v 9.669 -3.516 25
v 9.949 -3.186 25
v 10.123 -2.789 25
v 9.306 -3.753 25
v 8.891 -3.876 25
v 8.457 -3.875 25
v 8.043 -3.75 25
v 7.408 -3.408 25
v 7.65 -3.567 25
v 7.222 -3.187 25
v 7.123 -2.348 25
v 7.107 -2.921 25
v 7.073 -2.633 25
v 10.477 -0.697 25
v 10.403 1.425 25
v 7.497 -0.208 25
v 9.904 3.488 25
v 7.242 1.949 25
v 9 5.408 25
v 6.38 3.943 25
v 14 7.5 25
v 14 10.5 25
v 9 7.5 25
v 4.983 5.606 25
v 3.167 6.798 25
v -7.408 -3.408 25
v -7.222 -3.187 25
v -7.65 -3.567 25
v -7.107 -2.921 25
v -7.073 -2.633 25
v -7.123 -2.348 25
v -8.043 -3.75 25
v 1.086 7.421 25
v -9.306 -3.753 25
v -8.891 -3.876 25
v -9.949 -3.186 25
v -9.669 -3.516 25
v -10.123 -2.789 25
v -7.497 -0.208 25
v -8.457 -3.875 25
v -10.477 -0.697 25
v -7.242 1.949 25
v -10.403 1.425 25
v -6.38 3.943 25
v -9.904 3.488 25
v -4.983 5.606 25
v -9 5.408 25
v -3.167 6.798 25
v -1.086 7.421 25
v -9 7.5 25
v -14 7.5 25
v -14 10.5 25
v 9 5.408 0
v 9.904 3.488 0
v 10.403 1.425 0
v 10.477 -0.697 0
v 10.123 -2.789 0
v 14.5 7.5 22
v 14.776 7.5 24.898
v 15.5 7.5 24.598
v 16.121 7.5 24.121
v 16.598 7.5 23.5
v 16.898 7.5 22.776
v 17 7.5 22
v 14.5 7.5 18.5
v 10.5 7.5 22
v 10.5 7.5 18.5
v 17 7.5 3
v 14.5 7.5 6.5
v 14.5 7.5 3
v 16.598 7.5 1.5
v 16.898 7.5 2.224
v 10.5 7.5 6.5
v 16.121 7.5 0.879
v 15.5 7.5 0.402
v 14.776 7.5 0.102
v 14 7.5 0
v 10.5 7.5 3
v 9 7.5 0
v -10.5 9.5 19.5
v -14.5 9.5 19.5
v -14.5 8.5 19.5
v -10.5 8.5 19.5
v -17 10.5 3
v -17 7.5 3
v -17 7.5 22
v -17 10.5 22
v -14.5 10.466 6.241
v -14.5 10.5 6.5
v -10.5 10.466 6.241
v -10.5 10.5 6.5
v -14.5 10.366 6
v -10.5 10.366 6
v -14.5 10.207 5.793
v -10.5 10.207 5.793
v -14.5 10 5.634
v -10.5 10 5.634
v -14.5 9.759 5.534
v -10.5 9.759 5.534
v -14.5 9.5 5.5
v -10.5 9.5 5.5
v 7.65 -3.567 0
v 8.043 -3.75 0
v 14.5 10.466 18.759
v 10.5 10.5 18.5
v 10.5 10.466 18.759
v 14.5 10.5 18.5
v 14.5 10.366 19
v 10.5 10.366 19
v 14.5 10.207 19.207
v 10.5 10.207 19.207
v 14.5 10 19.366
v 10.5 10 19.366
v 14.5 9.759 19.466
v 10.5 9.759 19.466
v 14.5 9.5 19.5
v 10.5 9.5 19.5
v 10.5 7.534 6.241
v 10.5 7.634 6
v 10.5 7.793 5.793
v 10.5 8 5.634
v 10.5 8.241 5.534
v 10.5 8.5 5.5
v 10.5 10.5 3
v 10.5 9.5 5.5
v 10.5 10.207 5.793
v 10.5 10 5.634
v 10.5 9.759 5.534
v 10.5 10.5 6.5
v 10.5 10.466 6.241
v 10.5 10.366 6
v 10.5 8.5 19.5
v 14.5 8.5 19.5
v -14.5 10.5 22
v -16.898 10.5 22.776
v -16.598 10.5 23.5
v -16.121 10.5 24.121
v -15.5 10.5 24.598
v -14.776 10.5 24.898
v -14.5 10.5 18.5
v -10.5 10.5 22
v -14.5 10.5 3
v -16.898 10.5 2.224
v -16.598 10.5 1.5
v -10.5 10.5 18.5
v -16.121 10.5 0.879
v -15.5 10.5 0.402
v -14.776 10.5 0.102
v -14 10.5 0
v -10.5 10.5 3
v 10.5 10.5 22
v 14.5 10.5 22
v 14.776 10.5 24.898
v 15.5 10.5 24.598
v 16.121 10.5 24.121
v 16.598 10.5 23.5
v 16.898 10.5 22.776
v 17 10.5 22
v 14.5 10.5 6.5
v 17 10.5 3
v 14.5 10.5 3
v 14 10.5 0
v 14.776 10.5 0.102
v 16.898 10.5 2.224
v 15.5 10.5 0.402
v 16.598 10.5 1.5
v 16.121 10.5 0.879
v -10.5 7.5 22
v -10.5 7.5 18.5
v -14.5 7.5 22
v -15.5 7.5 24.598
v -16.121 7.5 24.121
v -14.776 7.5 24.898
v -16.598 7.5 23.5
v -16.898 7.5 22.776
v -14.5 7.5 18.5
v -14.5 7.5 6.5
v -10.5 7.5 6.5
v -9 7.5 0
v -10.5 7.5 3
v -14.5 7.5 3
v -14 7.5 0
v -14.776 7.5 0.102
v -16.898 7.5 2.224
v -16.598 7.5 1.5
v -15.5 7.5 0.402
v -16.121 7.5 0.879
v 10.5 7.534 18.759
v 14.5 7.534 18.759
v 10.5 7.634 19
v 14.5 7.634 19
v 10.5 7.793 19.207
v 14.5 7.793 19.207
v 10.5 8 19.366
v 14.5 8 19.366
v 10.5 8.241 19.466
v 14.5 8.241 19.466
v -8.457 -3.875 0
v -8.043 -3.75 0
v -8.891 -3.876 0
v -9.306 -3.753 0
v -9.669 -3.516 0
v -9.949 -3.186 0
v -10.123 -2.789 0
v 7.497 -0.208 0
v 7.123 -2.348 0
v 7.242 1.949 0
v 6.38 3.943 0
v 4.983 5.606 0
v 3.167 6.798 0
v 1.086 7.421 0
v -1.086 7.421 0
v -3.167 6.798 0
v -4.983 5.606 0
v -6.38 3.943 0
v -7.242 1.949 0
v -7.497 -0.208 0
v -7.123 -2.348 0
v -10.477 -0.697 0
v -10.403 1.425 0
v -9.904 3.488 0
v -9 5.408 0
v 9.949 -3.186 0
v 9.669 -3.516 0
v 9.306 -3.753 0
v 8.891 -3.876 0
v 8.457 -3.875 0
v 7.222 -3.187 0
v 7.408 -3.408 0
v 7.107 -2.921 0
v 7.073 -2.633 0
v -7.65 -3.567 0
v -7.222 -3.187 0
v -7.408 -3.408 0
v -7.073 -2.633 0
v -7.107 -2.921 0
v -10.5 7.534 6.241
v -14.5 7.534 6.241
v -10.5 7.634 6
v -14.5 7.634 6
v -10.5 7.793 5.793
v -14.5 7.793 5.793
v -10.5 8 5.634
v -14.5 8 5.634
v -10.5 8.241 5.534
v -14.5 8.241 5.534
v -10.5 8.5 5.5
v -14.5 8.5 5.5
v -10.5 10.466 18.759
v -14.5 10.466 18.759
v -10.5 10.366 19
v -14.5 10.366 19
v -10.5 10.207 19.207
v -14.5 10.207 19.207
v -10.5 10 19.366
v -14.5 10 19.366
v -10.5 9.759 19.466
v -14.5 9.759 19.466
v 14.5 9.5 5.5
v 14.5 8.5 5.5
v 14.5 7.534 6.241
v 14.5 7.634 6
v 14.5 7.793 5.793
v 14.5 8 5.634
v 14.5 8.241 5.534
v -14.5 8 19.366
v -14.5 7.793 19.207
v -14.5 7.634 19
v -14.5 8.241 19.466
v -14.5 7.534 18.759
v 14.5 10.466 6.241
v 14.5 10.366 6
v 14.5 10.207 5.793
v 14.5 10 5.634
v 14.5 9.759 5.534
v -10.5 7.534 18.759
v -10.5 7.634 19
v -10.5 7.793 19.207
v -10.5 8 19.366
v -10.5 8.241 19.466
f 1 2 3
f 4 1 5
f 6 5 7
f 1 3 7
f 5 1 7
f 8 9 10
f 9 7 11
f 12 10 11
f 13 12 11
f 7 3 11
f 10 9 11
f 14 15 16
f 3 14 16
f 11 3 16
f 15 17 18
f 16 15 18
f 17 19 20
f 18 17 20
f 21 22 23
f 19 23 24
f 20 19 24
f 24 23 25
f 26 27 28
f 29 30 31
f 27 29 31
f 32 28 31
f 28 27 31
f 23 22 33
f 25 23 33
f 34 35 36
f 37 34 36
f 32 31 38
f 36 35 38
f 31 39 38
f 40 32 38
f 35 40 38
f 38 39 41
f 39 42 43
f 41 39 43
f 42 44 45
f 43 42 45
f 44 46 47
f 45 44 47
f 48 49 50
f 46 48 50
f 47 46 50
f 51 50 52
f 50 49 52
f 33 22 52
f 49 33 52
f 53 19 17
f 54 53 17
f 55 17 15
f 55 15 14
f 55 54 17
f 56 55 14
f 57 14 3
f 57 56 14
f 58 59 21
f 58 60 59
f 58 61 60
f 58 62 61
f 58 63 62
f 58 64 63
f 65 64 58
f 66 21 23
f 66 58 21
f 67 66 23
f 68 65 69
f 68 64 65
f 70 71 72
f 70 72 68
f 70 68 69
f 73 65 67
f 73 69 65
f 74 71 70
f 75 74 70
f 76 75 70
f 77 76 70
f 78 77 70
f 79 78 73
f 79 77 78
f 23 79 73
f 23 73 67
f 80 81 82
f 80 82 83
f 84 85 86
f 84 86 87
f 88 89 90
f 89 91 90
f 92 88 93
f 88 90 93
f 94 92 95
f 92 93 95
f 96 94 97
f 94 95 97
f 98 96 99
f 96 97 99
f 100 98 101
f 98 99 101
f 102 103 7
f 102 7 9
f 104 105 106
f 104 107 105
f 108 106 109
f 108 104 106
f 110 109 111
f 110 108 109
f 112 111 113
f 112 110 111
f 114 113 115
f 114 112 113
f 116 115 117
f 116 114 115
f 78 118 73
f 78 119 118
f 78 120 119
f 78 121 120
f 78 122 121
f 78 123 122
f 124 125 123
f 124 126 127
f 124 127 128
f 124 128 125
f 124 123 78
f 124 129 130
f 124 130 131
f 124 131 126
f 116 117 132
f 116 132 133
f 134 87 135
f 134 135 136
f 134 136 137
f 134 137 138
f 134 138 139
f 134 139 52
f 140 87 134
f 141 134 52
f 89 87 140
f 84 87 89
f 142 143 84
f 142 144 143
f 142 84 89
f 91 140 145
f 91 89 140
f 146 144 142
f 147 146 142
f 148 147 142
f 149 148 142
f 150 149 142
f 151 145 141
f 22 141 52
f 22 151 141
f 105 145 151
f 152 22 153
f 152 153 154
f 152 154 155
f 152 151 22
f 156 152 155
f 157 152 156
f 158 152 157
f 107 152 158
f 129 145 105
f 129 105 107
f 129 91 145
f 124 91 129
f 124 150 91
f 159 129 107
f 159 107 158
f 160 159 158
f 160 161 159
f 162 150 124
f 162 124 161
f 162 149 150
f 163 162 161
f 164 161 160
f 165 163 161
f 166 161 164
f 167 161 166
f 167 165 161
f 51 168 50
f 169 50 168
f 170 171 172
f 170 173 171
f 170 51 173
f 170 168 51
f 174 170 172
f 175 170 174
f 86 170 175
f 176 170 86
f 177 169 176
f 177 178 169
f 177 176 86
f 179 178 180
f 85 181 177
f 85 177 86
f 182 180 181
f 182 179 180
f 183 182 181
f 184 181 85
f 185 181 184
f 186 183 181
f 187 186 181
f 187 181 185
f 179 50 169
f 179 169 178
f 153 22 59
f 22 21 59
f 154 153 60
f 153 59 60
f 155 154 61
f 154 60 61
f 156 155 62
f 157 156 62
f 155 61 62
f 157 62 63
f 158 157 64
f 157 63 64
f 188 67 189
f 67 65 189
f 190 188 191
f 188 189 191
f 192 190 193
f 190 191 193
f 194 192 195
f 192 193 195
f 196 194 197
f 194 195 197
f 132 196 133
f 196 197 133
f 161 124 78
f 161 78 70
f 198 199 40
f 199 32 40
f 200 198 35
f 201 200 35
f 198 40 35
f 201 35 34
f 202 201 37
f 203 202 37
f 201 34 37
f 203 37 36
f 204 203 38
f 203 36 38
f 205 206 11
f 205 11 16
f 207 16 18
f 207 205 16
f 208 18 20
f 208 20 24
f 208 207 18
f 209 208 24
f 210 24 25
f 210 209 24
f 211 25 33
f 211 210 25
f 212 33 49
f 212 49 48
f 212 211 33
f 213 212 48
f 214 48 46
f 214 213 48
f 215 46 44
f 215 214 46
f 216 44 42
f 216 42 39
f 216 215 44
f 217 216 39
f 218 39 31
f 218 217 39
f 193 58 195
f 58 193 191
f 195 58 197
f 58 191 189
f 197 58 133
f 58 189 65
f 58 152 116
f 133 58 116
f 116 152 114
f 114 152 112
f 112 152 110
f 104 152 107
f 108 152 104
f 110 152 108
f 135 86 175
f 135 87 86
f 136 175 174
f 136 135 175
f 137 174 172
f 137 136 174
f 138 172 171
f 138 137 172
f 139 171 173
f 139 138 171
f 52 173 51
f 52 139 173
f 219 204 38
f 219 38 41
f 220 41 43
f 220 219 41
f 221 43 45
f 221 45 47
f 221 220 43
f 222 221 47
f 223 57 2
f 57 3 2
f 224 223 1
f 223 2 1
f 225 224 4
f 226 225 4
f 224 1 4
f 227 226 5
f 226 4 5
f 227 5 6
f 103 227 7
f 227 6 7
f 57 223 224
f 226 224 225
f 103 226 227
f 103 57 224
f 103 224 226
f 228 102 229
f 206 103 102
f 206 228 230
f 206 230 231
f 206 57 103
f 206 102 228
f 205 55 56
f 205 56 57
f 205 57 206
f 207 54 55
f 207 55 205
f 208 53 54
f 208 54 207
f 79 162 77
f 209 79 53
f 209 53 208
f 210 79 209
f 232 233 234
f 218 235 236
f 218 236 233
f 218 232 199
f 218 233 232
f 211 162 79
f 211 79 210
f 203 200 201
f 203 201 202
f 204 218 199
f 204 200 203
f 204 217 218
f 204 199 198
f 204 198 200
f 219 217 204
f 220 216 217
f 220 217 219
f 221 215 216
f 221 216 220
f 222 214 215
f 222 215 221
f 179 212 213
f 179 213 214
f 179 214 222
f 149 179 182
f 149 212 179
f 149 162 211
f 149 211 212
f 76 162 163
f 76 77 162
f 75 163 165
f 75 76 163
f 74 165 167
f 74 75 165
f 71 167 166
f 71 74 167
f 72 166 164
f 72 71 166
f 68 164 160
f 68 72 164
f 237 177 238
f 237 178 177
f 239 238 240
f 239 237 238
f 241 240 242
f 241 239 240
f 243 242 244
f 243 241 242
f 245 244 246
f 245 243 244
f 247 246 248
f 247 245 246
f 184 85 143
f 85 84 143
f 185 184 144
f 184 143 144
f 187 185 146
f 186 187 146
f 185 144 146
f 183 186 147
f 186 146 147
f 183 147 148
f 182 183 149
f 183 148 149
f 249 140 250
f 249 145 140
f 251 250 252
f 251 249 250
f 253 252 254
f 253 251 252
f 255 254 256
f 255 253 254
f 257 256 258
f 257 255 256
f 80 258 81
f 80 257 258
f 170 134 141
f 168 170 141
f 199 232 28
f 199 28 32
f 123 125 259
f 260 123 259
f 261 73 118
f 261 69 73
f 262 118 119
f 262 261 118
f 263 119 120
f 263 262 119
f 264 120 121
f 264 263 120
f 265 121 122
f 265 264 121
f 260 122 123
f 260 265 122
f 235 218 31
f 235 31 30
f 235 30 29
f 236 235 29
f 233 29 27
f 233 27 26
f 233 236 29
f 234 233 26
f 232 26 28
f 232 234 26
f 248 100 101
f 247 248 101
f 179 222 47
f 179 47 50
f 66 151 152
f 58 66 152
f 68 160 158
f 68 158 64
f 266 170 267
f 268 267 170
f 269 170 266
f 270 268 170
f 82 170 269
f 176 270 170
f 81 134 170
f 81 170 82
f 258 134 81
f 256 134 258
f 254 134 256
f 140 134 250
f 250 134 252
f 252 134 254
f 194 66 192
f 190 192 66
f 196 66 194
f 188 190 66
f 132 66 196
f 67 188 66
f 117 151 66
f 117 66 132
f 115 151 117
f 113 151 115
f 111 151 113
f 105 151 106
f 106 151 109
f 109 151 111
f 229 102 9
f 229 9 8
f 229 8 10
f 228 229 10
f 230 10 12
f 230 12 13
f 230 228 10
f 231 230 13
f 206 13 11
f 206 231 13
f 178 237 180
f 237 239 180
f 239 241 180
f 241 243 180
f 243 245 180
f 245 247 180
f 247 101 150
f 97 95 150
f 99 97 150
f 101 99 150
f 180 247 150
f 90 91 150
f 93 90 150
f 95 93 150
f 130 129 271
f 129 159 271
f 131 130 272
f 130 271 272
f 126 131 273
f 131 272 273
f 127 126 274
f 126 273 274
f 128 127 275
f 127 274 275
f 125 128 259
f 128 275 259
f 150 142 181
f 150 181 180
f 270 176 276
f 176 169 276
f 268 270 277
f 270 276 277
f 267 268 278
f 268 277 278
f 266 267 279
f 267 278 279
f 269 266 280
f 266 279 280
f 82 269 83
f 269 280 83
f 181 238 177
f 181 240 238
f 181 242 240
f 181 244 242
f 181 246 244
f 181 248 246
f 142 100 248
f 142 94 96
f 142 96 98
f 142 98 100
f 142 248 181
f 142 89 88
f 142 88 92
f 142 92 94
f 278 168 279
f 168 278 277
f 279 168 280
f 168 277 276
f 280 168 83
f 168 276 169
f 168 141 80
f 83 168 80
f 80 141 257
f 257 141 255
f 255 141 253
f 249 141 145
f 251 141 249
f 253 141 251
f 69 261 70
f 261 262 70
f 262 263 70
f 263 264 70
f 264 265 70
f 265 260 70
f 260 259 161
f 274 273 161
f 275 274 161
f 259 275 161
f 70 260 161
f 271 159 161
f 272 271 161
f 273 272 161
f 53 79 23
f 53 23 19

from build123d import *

# Parameters (mm, degrees)
RESSALTO_EXTRUS_O1_DEPTH = 25
FILETE1_R                = 1.5
CORTE_EXTRUS_O1_REACH    = 35.483
ESBO_O3_W                = 4
ESBO_O3_H                = 2.5
FILETE2_R                = 1
FILETE3_R                = 3


with BuildPart() as part:
    # Esboço1 → Ressalto-extrusão1 (new body)
    with BuildSketch(Plane.XY):
        with BuildLine():
            Line((-17, 10.5), (17, 10.5))
            Line((17, 10.5), (17, 7.5))
            Line((17, 7.5), (9, 7.5))
            Line((9, 7.5), (9, 5.408326913))
            ThreePointArc((9, 5.408326913), (10.485597072, 0.549776353), (9.516231764, -4.437491748))
            Line((9.516231764, -4.437491748), (7.650118208, -3.567308706))
            ThreePointArc((7.650118208, -3.567308706), (7.15483055, -3.057799008), (7.123002767, -2.347941987))
            ThreePointArc((7.123002767, -2.347941987), (0, 7.5), (-7.123002767, -2.347941987))
            ThreePointArc((-7.123002767, -2.347941987), (-7.15483055, -3.057799008), (-7.650118208, -3.567308706))
            Line((-7.650118208, -3.567308706), (-9.516231764, -4.437491748))
            ThreePointArc((-9.516231764, -4.437491748), (-10.485597072, 0.549776353), (-9, 5.408326913))
            Line((-9, 5.408326913), (-9, 7.5))
            Line((-9, 7.5), (-17, 7.5))
            Line((-17, 7.5), (-17, 10.5))
        make_face()
    extrude(amount=RESSALTO_EXTRUS_O1_DEPTH)

    # Filete1
    filete1_edges = [part.edges().sort_by_distance(p)[0] for p in [
        (-9.516231764, -4.437491748, 12.5),
        (9.516231764, -4.437491748, 12.5),
    ]]
    fillet(filete1_edges, radius=FILETE1_R)

    # Esboço3 → Corte-extrusão1 (cut, up to next)
    with BuildSketch(Plane(origin=(0, 10.5, 0), x_dir=(1, 0, 0), z_dir=(0, 1, 0)), mode=Mode.PRIVATE) as corte_extrus_o1_sk1:
        with Locations((-12.5, -4.25)):
            Rectangle(ESBO_O3_W, ESBO_O3_H)
    corte_extrus_o1_tool1 = extrude(corte_extrus_o1_sk1.sketch, amount=-CORTE_EXTRUS_O1_REACH, mode=Mode.PRIVATE) & part.part
    # Esboço3 → Corte-extrusão1 (cut, up to next)
    with BuildSketch(Plane(origin=(0, 10.5, 0), x_dir=(1, 0, 0), z_dir=(0, 1, 0)), mode=Mode.PRIVATE) as corte_extrus_o1_sk2:
        with Locations((-12.5, -20.75)):
            Rectangle(ESBO_O3_W, ESBO_O3_H)
    corte_extrus_o1_tool2 = extrude(corte_extrus_o1_sk2.sketch, amount=-CORTE_EXTRUS_O1_REACH, mode=Mode.PRIVATE) & part.part
    # Esboço3 → Corte-extrusão1 (cut, up to next)
    with BuildSketch(Plane(origin=(0, 10.5, 0), x_dir=(1, 0, 0), z_dir=(0, 1, 0)), mode=Mode.PRIVATE) as corte_extrus_o1_sk3:
        with Locations((12.5, -20.75)):
            Rectangle(ESBO_O3_W, ESBO_O3_H)
    corte_extrus_o1_tool3 = extrude(corte_extrus_o1_sk3.sketch, amount=-CORTE_EXTRUS_O1_REACH, mode=Mode.PRIVATE) & part.part
    # Esboço3 → Corte-extrusão1 (cut, up to next)
    with BuildSketch(Plane(origin=(0, 10.5, 0), x_dir=(1, 0, 0), z_dir=(0, 1, 0)), mode=Mode.PRIVATE) as corte_extrus_o1_sk4:
        with Locations((12.5, -4.25)):
            Rectangle(ESBO_O3_W, ESBO_O3_H)
    corte_extrus_o1_tool4 = extrude(corte_extrus_o1_sk4.sketch, amount=-CORTE_EXTRUS_O1_REACH, mode=Mode.PRIVATE) & part.part
    add(corte_extrus_o1_tool1.solids().sort_by_distance((-12.5, 10.5, 4.25))[0], mode=Mode.SUBTRACT)
    add(corte_extrus_o1_tool2.solids().sort_by_distance((-12.5, 10.5, 20.75))[0], mode=Mode.SUBTRACT)
    add(corte_extrus_o1_tool3.solids().sort_by_distance((12.5, 10.5, 20.75))[0], mode=Mode.SUBTRACT)
    add(corte_extrus_o1_tool4.solids().sort_by_distance((12.5, 10.5, 4.25))[0], mode=Mode.SUBTRACT)

    # Filete2
    filete2_edges = [part.edges().sort_by_distance(p)[0] for p in [
        (12.5, 10.5, 5.5),
        (12.5, 7.5, 5.5),
        (12.5, 10.5, 19.5),
        (12.5, 7.5, 19.5),
        (-12.5, 10.5, 19.5),
        (-12.5, 7.5, 19.5),
        (-12.5, 10.5, 5.5),
        (-12.5, 7.5, 5.5),
    ]]
    fillet(filete2_edges, radius=FILETE2_R)

    # Filete3
    filete3_edges = [part.edges().sort_by_distance(p)[0] for p in [
        (-17, 9, 0),
        (17, 9, 0),
        (17, 9, 25),
        (-17, 9, 25),
    ]]
    fillet(filete3_edges, radius=FILETE3_R)


solid = part.part
